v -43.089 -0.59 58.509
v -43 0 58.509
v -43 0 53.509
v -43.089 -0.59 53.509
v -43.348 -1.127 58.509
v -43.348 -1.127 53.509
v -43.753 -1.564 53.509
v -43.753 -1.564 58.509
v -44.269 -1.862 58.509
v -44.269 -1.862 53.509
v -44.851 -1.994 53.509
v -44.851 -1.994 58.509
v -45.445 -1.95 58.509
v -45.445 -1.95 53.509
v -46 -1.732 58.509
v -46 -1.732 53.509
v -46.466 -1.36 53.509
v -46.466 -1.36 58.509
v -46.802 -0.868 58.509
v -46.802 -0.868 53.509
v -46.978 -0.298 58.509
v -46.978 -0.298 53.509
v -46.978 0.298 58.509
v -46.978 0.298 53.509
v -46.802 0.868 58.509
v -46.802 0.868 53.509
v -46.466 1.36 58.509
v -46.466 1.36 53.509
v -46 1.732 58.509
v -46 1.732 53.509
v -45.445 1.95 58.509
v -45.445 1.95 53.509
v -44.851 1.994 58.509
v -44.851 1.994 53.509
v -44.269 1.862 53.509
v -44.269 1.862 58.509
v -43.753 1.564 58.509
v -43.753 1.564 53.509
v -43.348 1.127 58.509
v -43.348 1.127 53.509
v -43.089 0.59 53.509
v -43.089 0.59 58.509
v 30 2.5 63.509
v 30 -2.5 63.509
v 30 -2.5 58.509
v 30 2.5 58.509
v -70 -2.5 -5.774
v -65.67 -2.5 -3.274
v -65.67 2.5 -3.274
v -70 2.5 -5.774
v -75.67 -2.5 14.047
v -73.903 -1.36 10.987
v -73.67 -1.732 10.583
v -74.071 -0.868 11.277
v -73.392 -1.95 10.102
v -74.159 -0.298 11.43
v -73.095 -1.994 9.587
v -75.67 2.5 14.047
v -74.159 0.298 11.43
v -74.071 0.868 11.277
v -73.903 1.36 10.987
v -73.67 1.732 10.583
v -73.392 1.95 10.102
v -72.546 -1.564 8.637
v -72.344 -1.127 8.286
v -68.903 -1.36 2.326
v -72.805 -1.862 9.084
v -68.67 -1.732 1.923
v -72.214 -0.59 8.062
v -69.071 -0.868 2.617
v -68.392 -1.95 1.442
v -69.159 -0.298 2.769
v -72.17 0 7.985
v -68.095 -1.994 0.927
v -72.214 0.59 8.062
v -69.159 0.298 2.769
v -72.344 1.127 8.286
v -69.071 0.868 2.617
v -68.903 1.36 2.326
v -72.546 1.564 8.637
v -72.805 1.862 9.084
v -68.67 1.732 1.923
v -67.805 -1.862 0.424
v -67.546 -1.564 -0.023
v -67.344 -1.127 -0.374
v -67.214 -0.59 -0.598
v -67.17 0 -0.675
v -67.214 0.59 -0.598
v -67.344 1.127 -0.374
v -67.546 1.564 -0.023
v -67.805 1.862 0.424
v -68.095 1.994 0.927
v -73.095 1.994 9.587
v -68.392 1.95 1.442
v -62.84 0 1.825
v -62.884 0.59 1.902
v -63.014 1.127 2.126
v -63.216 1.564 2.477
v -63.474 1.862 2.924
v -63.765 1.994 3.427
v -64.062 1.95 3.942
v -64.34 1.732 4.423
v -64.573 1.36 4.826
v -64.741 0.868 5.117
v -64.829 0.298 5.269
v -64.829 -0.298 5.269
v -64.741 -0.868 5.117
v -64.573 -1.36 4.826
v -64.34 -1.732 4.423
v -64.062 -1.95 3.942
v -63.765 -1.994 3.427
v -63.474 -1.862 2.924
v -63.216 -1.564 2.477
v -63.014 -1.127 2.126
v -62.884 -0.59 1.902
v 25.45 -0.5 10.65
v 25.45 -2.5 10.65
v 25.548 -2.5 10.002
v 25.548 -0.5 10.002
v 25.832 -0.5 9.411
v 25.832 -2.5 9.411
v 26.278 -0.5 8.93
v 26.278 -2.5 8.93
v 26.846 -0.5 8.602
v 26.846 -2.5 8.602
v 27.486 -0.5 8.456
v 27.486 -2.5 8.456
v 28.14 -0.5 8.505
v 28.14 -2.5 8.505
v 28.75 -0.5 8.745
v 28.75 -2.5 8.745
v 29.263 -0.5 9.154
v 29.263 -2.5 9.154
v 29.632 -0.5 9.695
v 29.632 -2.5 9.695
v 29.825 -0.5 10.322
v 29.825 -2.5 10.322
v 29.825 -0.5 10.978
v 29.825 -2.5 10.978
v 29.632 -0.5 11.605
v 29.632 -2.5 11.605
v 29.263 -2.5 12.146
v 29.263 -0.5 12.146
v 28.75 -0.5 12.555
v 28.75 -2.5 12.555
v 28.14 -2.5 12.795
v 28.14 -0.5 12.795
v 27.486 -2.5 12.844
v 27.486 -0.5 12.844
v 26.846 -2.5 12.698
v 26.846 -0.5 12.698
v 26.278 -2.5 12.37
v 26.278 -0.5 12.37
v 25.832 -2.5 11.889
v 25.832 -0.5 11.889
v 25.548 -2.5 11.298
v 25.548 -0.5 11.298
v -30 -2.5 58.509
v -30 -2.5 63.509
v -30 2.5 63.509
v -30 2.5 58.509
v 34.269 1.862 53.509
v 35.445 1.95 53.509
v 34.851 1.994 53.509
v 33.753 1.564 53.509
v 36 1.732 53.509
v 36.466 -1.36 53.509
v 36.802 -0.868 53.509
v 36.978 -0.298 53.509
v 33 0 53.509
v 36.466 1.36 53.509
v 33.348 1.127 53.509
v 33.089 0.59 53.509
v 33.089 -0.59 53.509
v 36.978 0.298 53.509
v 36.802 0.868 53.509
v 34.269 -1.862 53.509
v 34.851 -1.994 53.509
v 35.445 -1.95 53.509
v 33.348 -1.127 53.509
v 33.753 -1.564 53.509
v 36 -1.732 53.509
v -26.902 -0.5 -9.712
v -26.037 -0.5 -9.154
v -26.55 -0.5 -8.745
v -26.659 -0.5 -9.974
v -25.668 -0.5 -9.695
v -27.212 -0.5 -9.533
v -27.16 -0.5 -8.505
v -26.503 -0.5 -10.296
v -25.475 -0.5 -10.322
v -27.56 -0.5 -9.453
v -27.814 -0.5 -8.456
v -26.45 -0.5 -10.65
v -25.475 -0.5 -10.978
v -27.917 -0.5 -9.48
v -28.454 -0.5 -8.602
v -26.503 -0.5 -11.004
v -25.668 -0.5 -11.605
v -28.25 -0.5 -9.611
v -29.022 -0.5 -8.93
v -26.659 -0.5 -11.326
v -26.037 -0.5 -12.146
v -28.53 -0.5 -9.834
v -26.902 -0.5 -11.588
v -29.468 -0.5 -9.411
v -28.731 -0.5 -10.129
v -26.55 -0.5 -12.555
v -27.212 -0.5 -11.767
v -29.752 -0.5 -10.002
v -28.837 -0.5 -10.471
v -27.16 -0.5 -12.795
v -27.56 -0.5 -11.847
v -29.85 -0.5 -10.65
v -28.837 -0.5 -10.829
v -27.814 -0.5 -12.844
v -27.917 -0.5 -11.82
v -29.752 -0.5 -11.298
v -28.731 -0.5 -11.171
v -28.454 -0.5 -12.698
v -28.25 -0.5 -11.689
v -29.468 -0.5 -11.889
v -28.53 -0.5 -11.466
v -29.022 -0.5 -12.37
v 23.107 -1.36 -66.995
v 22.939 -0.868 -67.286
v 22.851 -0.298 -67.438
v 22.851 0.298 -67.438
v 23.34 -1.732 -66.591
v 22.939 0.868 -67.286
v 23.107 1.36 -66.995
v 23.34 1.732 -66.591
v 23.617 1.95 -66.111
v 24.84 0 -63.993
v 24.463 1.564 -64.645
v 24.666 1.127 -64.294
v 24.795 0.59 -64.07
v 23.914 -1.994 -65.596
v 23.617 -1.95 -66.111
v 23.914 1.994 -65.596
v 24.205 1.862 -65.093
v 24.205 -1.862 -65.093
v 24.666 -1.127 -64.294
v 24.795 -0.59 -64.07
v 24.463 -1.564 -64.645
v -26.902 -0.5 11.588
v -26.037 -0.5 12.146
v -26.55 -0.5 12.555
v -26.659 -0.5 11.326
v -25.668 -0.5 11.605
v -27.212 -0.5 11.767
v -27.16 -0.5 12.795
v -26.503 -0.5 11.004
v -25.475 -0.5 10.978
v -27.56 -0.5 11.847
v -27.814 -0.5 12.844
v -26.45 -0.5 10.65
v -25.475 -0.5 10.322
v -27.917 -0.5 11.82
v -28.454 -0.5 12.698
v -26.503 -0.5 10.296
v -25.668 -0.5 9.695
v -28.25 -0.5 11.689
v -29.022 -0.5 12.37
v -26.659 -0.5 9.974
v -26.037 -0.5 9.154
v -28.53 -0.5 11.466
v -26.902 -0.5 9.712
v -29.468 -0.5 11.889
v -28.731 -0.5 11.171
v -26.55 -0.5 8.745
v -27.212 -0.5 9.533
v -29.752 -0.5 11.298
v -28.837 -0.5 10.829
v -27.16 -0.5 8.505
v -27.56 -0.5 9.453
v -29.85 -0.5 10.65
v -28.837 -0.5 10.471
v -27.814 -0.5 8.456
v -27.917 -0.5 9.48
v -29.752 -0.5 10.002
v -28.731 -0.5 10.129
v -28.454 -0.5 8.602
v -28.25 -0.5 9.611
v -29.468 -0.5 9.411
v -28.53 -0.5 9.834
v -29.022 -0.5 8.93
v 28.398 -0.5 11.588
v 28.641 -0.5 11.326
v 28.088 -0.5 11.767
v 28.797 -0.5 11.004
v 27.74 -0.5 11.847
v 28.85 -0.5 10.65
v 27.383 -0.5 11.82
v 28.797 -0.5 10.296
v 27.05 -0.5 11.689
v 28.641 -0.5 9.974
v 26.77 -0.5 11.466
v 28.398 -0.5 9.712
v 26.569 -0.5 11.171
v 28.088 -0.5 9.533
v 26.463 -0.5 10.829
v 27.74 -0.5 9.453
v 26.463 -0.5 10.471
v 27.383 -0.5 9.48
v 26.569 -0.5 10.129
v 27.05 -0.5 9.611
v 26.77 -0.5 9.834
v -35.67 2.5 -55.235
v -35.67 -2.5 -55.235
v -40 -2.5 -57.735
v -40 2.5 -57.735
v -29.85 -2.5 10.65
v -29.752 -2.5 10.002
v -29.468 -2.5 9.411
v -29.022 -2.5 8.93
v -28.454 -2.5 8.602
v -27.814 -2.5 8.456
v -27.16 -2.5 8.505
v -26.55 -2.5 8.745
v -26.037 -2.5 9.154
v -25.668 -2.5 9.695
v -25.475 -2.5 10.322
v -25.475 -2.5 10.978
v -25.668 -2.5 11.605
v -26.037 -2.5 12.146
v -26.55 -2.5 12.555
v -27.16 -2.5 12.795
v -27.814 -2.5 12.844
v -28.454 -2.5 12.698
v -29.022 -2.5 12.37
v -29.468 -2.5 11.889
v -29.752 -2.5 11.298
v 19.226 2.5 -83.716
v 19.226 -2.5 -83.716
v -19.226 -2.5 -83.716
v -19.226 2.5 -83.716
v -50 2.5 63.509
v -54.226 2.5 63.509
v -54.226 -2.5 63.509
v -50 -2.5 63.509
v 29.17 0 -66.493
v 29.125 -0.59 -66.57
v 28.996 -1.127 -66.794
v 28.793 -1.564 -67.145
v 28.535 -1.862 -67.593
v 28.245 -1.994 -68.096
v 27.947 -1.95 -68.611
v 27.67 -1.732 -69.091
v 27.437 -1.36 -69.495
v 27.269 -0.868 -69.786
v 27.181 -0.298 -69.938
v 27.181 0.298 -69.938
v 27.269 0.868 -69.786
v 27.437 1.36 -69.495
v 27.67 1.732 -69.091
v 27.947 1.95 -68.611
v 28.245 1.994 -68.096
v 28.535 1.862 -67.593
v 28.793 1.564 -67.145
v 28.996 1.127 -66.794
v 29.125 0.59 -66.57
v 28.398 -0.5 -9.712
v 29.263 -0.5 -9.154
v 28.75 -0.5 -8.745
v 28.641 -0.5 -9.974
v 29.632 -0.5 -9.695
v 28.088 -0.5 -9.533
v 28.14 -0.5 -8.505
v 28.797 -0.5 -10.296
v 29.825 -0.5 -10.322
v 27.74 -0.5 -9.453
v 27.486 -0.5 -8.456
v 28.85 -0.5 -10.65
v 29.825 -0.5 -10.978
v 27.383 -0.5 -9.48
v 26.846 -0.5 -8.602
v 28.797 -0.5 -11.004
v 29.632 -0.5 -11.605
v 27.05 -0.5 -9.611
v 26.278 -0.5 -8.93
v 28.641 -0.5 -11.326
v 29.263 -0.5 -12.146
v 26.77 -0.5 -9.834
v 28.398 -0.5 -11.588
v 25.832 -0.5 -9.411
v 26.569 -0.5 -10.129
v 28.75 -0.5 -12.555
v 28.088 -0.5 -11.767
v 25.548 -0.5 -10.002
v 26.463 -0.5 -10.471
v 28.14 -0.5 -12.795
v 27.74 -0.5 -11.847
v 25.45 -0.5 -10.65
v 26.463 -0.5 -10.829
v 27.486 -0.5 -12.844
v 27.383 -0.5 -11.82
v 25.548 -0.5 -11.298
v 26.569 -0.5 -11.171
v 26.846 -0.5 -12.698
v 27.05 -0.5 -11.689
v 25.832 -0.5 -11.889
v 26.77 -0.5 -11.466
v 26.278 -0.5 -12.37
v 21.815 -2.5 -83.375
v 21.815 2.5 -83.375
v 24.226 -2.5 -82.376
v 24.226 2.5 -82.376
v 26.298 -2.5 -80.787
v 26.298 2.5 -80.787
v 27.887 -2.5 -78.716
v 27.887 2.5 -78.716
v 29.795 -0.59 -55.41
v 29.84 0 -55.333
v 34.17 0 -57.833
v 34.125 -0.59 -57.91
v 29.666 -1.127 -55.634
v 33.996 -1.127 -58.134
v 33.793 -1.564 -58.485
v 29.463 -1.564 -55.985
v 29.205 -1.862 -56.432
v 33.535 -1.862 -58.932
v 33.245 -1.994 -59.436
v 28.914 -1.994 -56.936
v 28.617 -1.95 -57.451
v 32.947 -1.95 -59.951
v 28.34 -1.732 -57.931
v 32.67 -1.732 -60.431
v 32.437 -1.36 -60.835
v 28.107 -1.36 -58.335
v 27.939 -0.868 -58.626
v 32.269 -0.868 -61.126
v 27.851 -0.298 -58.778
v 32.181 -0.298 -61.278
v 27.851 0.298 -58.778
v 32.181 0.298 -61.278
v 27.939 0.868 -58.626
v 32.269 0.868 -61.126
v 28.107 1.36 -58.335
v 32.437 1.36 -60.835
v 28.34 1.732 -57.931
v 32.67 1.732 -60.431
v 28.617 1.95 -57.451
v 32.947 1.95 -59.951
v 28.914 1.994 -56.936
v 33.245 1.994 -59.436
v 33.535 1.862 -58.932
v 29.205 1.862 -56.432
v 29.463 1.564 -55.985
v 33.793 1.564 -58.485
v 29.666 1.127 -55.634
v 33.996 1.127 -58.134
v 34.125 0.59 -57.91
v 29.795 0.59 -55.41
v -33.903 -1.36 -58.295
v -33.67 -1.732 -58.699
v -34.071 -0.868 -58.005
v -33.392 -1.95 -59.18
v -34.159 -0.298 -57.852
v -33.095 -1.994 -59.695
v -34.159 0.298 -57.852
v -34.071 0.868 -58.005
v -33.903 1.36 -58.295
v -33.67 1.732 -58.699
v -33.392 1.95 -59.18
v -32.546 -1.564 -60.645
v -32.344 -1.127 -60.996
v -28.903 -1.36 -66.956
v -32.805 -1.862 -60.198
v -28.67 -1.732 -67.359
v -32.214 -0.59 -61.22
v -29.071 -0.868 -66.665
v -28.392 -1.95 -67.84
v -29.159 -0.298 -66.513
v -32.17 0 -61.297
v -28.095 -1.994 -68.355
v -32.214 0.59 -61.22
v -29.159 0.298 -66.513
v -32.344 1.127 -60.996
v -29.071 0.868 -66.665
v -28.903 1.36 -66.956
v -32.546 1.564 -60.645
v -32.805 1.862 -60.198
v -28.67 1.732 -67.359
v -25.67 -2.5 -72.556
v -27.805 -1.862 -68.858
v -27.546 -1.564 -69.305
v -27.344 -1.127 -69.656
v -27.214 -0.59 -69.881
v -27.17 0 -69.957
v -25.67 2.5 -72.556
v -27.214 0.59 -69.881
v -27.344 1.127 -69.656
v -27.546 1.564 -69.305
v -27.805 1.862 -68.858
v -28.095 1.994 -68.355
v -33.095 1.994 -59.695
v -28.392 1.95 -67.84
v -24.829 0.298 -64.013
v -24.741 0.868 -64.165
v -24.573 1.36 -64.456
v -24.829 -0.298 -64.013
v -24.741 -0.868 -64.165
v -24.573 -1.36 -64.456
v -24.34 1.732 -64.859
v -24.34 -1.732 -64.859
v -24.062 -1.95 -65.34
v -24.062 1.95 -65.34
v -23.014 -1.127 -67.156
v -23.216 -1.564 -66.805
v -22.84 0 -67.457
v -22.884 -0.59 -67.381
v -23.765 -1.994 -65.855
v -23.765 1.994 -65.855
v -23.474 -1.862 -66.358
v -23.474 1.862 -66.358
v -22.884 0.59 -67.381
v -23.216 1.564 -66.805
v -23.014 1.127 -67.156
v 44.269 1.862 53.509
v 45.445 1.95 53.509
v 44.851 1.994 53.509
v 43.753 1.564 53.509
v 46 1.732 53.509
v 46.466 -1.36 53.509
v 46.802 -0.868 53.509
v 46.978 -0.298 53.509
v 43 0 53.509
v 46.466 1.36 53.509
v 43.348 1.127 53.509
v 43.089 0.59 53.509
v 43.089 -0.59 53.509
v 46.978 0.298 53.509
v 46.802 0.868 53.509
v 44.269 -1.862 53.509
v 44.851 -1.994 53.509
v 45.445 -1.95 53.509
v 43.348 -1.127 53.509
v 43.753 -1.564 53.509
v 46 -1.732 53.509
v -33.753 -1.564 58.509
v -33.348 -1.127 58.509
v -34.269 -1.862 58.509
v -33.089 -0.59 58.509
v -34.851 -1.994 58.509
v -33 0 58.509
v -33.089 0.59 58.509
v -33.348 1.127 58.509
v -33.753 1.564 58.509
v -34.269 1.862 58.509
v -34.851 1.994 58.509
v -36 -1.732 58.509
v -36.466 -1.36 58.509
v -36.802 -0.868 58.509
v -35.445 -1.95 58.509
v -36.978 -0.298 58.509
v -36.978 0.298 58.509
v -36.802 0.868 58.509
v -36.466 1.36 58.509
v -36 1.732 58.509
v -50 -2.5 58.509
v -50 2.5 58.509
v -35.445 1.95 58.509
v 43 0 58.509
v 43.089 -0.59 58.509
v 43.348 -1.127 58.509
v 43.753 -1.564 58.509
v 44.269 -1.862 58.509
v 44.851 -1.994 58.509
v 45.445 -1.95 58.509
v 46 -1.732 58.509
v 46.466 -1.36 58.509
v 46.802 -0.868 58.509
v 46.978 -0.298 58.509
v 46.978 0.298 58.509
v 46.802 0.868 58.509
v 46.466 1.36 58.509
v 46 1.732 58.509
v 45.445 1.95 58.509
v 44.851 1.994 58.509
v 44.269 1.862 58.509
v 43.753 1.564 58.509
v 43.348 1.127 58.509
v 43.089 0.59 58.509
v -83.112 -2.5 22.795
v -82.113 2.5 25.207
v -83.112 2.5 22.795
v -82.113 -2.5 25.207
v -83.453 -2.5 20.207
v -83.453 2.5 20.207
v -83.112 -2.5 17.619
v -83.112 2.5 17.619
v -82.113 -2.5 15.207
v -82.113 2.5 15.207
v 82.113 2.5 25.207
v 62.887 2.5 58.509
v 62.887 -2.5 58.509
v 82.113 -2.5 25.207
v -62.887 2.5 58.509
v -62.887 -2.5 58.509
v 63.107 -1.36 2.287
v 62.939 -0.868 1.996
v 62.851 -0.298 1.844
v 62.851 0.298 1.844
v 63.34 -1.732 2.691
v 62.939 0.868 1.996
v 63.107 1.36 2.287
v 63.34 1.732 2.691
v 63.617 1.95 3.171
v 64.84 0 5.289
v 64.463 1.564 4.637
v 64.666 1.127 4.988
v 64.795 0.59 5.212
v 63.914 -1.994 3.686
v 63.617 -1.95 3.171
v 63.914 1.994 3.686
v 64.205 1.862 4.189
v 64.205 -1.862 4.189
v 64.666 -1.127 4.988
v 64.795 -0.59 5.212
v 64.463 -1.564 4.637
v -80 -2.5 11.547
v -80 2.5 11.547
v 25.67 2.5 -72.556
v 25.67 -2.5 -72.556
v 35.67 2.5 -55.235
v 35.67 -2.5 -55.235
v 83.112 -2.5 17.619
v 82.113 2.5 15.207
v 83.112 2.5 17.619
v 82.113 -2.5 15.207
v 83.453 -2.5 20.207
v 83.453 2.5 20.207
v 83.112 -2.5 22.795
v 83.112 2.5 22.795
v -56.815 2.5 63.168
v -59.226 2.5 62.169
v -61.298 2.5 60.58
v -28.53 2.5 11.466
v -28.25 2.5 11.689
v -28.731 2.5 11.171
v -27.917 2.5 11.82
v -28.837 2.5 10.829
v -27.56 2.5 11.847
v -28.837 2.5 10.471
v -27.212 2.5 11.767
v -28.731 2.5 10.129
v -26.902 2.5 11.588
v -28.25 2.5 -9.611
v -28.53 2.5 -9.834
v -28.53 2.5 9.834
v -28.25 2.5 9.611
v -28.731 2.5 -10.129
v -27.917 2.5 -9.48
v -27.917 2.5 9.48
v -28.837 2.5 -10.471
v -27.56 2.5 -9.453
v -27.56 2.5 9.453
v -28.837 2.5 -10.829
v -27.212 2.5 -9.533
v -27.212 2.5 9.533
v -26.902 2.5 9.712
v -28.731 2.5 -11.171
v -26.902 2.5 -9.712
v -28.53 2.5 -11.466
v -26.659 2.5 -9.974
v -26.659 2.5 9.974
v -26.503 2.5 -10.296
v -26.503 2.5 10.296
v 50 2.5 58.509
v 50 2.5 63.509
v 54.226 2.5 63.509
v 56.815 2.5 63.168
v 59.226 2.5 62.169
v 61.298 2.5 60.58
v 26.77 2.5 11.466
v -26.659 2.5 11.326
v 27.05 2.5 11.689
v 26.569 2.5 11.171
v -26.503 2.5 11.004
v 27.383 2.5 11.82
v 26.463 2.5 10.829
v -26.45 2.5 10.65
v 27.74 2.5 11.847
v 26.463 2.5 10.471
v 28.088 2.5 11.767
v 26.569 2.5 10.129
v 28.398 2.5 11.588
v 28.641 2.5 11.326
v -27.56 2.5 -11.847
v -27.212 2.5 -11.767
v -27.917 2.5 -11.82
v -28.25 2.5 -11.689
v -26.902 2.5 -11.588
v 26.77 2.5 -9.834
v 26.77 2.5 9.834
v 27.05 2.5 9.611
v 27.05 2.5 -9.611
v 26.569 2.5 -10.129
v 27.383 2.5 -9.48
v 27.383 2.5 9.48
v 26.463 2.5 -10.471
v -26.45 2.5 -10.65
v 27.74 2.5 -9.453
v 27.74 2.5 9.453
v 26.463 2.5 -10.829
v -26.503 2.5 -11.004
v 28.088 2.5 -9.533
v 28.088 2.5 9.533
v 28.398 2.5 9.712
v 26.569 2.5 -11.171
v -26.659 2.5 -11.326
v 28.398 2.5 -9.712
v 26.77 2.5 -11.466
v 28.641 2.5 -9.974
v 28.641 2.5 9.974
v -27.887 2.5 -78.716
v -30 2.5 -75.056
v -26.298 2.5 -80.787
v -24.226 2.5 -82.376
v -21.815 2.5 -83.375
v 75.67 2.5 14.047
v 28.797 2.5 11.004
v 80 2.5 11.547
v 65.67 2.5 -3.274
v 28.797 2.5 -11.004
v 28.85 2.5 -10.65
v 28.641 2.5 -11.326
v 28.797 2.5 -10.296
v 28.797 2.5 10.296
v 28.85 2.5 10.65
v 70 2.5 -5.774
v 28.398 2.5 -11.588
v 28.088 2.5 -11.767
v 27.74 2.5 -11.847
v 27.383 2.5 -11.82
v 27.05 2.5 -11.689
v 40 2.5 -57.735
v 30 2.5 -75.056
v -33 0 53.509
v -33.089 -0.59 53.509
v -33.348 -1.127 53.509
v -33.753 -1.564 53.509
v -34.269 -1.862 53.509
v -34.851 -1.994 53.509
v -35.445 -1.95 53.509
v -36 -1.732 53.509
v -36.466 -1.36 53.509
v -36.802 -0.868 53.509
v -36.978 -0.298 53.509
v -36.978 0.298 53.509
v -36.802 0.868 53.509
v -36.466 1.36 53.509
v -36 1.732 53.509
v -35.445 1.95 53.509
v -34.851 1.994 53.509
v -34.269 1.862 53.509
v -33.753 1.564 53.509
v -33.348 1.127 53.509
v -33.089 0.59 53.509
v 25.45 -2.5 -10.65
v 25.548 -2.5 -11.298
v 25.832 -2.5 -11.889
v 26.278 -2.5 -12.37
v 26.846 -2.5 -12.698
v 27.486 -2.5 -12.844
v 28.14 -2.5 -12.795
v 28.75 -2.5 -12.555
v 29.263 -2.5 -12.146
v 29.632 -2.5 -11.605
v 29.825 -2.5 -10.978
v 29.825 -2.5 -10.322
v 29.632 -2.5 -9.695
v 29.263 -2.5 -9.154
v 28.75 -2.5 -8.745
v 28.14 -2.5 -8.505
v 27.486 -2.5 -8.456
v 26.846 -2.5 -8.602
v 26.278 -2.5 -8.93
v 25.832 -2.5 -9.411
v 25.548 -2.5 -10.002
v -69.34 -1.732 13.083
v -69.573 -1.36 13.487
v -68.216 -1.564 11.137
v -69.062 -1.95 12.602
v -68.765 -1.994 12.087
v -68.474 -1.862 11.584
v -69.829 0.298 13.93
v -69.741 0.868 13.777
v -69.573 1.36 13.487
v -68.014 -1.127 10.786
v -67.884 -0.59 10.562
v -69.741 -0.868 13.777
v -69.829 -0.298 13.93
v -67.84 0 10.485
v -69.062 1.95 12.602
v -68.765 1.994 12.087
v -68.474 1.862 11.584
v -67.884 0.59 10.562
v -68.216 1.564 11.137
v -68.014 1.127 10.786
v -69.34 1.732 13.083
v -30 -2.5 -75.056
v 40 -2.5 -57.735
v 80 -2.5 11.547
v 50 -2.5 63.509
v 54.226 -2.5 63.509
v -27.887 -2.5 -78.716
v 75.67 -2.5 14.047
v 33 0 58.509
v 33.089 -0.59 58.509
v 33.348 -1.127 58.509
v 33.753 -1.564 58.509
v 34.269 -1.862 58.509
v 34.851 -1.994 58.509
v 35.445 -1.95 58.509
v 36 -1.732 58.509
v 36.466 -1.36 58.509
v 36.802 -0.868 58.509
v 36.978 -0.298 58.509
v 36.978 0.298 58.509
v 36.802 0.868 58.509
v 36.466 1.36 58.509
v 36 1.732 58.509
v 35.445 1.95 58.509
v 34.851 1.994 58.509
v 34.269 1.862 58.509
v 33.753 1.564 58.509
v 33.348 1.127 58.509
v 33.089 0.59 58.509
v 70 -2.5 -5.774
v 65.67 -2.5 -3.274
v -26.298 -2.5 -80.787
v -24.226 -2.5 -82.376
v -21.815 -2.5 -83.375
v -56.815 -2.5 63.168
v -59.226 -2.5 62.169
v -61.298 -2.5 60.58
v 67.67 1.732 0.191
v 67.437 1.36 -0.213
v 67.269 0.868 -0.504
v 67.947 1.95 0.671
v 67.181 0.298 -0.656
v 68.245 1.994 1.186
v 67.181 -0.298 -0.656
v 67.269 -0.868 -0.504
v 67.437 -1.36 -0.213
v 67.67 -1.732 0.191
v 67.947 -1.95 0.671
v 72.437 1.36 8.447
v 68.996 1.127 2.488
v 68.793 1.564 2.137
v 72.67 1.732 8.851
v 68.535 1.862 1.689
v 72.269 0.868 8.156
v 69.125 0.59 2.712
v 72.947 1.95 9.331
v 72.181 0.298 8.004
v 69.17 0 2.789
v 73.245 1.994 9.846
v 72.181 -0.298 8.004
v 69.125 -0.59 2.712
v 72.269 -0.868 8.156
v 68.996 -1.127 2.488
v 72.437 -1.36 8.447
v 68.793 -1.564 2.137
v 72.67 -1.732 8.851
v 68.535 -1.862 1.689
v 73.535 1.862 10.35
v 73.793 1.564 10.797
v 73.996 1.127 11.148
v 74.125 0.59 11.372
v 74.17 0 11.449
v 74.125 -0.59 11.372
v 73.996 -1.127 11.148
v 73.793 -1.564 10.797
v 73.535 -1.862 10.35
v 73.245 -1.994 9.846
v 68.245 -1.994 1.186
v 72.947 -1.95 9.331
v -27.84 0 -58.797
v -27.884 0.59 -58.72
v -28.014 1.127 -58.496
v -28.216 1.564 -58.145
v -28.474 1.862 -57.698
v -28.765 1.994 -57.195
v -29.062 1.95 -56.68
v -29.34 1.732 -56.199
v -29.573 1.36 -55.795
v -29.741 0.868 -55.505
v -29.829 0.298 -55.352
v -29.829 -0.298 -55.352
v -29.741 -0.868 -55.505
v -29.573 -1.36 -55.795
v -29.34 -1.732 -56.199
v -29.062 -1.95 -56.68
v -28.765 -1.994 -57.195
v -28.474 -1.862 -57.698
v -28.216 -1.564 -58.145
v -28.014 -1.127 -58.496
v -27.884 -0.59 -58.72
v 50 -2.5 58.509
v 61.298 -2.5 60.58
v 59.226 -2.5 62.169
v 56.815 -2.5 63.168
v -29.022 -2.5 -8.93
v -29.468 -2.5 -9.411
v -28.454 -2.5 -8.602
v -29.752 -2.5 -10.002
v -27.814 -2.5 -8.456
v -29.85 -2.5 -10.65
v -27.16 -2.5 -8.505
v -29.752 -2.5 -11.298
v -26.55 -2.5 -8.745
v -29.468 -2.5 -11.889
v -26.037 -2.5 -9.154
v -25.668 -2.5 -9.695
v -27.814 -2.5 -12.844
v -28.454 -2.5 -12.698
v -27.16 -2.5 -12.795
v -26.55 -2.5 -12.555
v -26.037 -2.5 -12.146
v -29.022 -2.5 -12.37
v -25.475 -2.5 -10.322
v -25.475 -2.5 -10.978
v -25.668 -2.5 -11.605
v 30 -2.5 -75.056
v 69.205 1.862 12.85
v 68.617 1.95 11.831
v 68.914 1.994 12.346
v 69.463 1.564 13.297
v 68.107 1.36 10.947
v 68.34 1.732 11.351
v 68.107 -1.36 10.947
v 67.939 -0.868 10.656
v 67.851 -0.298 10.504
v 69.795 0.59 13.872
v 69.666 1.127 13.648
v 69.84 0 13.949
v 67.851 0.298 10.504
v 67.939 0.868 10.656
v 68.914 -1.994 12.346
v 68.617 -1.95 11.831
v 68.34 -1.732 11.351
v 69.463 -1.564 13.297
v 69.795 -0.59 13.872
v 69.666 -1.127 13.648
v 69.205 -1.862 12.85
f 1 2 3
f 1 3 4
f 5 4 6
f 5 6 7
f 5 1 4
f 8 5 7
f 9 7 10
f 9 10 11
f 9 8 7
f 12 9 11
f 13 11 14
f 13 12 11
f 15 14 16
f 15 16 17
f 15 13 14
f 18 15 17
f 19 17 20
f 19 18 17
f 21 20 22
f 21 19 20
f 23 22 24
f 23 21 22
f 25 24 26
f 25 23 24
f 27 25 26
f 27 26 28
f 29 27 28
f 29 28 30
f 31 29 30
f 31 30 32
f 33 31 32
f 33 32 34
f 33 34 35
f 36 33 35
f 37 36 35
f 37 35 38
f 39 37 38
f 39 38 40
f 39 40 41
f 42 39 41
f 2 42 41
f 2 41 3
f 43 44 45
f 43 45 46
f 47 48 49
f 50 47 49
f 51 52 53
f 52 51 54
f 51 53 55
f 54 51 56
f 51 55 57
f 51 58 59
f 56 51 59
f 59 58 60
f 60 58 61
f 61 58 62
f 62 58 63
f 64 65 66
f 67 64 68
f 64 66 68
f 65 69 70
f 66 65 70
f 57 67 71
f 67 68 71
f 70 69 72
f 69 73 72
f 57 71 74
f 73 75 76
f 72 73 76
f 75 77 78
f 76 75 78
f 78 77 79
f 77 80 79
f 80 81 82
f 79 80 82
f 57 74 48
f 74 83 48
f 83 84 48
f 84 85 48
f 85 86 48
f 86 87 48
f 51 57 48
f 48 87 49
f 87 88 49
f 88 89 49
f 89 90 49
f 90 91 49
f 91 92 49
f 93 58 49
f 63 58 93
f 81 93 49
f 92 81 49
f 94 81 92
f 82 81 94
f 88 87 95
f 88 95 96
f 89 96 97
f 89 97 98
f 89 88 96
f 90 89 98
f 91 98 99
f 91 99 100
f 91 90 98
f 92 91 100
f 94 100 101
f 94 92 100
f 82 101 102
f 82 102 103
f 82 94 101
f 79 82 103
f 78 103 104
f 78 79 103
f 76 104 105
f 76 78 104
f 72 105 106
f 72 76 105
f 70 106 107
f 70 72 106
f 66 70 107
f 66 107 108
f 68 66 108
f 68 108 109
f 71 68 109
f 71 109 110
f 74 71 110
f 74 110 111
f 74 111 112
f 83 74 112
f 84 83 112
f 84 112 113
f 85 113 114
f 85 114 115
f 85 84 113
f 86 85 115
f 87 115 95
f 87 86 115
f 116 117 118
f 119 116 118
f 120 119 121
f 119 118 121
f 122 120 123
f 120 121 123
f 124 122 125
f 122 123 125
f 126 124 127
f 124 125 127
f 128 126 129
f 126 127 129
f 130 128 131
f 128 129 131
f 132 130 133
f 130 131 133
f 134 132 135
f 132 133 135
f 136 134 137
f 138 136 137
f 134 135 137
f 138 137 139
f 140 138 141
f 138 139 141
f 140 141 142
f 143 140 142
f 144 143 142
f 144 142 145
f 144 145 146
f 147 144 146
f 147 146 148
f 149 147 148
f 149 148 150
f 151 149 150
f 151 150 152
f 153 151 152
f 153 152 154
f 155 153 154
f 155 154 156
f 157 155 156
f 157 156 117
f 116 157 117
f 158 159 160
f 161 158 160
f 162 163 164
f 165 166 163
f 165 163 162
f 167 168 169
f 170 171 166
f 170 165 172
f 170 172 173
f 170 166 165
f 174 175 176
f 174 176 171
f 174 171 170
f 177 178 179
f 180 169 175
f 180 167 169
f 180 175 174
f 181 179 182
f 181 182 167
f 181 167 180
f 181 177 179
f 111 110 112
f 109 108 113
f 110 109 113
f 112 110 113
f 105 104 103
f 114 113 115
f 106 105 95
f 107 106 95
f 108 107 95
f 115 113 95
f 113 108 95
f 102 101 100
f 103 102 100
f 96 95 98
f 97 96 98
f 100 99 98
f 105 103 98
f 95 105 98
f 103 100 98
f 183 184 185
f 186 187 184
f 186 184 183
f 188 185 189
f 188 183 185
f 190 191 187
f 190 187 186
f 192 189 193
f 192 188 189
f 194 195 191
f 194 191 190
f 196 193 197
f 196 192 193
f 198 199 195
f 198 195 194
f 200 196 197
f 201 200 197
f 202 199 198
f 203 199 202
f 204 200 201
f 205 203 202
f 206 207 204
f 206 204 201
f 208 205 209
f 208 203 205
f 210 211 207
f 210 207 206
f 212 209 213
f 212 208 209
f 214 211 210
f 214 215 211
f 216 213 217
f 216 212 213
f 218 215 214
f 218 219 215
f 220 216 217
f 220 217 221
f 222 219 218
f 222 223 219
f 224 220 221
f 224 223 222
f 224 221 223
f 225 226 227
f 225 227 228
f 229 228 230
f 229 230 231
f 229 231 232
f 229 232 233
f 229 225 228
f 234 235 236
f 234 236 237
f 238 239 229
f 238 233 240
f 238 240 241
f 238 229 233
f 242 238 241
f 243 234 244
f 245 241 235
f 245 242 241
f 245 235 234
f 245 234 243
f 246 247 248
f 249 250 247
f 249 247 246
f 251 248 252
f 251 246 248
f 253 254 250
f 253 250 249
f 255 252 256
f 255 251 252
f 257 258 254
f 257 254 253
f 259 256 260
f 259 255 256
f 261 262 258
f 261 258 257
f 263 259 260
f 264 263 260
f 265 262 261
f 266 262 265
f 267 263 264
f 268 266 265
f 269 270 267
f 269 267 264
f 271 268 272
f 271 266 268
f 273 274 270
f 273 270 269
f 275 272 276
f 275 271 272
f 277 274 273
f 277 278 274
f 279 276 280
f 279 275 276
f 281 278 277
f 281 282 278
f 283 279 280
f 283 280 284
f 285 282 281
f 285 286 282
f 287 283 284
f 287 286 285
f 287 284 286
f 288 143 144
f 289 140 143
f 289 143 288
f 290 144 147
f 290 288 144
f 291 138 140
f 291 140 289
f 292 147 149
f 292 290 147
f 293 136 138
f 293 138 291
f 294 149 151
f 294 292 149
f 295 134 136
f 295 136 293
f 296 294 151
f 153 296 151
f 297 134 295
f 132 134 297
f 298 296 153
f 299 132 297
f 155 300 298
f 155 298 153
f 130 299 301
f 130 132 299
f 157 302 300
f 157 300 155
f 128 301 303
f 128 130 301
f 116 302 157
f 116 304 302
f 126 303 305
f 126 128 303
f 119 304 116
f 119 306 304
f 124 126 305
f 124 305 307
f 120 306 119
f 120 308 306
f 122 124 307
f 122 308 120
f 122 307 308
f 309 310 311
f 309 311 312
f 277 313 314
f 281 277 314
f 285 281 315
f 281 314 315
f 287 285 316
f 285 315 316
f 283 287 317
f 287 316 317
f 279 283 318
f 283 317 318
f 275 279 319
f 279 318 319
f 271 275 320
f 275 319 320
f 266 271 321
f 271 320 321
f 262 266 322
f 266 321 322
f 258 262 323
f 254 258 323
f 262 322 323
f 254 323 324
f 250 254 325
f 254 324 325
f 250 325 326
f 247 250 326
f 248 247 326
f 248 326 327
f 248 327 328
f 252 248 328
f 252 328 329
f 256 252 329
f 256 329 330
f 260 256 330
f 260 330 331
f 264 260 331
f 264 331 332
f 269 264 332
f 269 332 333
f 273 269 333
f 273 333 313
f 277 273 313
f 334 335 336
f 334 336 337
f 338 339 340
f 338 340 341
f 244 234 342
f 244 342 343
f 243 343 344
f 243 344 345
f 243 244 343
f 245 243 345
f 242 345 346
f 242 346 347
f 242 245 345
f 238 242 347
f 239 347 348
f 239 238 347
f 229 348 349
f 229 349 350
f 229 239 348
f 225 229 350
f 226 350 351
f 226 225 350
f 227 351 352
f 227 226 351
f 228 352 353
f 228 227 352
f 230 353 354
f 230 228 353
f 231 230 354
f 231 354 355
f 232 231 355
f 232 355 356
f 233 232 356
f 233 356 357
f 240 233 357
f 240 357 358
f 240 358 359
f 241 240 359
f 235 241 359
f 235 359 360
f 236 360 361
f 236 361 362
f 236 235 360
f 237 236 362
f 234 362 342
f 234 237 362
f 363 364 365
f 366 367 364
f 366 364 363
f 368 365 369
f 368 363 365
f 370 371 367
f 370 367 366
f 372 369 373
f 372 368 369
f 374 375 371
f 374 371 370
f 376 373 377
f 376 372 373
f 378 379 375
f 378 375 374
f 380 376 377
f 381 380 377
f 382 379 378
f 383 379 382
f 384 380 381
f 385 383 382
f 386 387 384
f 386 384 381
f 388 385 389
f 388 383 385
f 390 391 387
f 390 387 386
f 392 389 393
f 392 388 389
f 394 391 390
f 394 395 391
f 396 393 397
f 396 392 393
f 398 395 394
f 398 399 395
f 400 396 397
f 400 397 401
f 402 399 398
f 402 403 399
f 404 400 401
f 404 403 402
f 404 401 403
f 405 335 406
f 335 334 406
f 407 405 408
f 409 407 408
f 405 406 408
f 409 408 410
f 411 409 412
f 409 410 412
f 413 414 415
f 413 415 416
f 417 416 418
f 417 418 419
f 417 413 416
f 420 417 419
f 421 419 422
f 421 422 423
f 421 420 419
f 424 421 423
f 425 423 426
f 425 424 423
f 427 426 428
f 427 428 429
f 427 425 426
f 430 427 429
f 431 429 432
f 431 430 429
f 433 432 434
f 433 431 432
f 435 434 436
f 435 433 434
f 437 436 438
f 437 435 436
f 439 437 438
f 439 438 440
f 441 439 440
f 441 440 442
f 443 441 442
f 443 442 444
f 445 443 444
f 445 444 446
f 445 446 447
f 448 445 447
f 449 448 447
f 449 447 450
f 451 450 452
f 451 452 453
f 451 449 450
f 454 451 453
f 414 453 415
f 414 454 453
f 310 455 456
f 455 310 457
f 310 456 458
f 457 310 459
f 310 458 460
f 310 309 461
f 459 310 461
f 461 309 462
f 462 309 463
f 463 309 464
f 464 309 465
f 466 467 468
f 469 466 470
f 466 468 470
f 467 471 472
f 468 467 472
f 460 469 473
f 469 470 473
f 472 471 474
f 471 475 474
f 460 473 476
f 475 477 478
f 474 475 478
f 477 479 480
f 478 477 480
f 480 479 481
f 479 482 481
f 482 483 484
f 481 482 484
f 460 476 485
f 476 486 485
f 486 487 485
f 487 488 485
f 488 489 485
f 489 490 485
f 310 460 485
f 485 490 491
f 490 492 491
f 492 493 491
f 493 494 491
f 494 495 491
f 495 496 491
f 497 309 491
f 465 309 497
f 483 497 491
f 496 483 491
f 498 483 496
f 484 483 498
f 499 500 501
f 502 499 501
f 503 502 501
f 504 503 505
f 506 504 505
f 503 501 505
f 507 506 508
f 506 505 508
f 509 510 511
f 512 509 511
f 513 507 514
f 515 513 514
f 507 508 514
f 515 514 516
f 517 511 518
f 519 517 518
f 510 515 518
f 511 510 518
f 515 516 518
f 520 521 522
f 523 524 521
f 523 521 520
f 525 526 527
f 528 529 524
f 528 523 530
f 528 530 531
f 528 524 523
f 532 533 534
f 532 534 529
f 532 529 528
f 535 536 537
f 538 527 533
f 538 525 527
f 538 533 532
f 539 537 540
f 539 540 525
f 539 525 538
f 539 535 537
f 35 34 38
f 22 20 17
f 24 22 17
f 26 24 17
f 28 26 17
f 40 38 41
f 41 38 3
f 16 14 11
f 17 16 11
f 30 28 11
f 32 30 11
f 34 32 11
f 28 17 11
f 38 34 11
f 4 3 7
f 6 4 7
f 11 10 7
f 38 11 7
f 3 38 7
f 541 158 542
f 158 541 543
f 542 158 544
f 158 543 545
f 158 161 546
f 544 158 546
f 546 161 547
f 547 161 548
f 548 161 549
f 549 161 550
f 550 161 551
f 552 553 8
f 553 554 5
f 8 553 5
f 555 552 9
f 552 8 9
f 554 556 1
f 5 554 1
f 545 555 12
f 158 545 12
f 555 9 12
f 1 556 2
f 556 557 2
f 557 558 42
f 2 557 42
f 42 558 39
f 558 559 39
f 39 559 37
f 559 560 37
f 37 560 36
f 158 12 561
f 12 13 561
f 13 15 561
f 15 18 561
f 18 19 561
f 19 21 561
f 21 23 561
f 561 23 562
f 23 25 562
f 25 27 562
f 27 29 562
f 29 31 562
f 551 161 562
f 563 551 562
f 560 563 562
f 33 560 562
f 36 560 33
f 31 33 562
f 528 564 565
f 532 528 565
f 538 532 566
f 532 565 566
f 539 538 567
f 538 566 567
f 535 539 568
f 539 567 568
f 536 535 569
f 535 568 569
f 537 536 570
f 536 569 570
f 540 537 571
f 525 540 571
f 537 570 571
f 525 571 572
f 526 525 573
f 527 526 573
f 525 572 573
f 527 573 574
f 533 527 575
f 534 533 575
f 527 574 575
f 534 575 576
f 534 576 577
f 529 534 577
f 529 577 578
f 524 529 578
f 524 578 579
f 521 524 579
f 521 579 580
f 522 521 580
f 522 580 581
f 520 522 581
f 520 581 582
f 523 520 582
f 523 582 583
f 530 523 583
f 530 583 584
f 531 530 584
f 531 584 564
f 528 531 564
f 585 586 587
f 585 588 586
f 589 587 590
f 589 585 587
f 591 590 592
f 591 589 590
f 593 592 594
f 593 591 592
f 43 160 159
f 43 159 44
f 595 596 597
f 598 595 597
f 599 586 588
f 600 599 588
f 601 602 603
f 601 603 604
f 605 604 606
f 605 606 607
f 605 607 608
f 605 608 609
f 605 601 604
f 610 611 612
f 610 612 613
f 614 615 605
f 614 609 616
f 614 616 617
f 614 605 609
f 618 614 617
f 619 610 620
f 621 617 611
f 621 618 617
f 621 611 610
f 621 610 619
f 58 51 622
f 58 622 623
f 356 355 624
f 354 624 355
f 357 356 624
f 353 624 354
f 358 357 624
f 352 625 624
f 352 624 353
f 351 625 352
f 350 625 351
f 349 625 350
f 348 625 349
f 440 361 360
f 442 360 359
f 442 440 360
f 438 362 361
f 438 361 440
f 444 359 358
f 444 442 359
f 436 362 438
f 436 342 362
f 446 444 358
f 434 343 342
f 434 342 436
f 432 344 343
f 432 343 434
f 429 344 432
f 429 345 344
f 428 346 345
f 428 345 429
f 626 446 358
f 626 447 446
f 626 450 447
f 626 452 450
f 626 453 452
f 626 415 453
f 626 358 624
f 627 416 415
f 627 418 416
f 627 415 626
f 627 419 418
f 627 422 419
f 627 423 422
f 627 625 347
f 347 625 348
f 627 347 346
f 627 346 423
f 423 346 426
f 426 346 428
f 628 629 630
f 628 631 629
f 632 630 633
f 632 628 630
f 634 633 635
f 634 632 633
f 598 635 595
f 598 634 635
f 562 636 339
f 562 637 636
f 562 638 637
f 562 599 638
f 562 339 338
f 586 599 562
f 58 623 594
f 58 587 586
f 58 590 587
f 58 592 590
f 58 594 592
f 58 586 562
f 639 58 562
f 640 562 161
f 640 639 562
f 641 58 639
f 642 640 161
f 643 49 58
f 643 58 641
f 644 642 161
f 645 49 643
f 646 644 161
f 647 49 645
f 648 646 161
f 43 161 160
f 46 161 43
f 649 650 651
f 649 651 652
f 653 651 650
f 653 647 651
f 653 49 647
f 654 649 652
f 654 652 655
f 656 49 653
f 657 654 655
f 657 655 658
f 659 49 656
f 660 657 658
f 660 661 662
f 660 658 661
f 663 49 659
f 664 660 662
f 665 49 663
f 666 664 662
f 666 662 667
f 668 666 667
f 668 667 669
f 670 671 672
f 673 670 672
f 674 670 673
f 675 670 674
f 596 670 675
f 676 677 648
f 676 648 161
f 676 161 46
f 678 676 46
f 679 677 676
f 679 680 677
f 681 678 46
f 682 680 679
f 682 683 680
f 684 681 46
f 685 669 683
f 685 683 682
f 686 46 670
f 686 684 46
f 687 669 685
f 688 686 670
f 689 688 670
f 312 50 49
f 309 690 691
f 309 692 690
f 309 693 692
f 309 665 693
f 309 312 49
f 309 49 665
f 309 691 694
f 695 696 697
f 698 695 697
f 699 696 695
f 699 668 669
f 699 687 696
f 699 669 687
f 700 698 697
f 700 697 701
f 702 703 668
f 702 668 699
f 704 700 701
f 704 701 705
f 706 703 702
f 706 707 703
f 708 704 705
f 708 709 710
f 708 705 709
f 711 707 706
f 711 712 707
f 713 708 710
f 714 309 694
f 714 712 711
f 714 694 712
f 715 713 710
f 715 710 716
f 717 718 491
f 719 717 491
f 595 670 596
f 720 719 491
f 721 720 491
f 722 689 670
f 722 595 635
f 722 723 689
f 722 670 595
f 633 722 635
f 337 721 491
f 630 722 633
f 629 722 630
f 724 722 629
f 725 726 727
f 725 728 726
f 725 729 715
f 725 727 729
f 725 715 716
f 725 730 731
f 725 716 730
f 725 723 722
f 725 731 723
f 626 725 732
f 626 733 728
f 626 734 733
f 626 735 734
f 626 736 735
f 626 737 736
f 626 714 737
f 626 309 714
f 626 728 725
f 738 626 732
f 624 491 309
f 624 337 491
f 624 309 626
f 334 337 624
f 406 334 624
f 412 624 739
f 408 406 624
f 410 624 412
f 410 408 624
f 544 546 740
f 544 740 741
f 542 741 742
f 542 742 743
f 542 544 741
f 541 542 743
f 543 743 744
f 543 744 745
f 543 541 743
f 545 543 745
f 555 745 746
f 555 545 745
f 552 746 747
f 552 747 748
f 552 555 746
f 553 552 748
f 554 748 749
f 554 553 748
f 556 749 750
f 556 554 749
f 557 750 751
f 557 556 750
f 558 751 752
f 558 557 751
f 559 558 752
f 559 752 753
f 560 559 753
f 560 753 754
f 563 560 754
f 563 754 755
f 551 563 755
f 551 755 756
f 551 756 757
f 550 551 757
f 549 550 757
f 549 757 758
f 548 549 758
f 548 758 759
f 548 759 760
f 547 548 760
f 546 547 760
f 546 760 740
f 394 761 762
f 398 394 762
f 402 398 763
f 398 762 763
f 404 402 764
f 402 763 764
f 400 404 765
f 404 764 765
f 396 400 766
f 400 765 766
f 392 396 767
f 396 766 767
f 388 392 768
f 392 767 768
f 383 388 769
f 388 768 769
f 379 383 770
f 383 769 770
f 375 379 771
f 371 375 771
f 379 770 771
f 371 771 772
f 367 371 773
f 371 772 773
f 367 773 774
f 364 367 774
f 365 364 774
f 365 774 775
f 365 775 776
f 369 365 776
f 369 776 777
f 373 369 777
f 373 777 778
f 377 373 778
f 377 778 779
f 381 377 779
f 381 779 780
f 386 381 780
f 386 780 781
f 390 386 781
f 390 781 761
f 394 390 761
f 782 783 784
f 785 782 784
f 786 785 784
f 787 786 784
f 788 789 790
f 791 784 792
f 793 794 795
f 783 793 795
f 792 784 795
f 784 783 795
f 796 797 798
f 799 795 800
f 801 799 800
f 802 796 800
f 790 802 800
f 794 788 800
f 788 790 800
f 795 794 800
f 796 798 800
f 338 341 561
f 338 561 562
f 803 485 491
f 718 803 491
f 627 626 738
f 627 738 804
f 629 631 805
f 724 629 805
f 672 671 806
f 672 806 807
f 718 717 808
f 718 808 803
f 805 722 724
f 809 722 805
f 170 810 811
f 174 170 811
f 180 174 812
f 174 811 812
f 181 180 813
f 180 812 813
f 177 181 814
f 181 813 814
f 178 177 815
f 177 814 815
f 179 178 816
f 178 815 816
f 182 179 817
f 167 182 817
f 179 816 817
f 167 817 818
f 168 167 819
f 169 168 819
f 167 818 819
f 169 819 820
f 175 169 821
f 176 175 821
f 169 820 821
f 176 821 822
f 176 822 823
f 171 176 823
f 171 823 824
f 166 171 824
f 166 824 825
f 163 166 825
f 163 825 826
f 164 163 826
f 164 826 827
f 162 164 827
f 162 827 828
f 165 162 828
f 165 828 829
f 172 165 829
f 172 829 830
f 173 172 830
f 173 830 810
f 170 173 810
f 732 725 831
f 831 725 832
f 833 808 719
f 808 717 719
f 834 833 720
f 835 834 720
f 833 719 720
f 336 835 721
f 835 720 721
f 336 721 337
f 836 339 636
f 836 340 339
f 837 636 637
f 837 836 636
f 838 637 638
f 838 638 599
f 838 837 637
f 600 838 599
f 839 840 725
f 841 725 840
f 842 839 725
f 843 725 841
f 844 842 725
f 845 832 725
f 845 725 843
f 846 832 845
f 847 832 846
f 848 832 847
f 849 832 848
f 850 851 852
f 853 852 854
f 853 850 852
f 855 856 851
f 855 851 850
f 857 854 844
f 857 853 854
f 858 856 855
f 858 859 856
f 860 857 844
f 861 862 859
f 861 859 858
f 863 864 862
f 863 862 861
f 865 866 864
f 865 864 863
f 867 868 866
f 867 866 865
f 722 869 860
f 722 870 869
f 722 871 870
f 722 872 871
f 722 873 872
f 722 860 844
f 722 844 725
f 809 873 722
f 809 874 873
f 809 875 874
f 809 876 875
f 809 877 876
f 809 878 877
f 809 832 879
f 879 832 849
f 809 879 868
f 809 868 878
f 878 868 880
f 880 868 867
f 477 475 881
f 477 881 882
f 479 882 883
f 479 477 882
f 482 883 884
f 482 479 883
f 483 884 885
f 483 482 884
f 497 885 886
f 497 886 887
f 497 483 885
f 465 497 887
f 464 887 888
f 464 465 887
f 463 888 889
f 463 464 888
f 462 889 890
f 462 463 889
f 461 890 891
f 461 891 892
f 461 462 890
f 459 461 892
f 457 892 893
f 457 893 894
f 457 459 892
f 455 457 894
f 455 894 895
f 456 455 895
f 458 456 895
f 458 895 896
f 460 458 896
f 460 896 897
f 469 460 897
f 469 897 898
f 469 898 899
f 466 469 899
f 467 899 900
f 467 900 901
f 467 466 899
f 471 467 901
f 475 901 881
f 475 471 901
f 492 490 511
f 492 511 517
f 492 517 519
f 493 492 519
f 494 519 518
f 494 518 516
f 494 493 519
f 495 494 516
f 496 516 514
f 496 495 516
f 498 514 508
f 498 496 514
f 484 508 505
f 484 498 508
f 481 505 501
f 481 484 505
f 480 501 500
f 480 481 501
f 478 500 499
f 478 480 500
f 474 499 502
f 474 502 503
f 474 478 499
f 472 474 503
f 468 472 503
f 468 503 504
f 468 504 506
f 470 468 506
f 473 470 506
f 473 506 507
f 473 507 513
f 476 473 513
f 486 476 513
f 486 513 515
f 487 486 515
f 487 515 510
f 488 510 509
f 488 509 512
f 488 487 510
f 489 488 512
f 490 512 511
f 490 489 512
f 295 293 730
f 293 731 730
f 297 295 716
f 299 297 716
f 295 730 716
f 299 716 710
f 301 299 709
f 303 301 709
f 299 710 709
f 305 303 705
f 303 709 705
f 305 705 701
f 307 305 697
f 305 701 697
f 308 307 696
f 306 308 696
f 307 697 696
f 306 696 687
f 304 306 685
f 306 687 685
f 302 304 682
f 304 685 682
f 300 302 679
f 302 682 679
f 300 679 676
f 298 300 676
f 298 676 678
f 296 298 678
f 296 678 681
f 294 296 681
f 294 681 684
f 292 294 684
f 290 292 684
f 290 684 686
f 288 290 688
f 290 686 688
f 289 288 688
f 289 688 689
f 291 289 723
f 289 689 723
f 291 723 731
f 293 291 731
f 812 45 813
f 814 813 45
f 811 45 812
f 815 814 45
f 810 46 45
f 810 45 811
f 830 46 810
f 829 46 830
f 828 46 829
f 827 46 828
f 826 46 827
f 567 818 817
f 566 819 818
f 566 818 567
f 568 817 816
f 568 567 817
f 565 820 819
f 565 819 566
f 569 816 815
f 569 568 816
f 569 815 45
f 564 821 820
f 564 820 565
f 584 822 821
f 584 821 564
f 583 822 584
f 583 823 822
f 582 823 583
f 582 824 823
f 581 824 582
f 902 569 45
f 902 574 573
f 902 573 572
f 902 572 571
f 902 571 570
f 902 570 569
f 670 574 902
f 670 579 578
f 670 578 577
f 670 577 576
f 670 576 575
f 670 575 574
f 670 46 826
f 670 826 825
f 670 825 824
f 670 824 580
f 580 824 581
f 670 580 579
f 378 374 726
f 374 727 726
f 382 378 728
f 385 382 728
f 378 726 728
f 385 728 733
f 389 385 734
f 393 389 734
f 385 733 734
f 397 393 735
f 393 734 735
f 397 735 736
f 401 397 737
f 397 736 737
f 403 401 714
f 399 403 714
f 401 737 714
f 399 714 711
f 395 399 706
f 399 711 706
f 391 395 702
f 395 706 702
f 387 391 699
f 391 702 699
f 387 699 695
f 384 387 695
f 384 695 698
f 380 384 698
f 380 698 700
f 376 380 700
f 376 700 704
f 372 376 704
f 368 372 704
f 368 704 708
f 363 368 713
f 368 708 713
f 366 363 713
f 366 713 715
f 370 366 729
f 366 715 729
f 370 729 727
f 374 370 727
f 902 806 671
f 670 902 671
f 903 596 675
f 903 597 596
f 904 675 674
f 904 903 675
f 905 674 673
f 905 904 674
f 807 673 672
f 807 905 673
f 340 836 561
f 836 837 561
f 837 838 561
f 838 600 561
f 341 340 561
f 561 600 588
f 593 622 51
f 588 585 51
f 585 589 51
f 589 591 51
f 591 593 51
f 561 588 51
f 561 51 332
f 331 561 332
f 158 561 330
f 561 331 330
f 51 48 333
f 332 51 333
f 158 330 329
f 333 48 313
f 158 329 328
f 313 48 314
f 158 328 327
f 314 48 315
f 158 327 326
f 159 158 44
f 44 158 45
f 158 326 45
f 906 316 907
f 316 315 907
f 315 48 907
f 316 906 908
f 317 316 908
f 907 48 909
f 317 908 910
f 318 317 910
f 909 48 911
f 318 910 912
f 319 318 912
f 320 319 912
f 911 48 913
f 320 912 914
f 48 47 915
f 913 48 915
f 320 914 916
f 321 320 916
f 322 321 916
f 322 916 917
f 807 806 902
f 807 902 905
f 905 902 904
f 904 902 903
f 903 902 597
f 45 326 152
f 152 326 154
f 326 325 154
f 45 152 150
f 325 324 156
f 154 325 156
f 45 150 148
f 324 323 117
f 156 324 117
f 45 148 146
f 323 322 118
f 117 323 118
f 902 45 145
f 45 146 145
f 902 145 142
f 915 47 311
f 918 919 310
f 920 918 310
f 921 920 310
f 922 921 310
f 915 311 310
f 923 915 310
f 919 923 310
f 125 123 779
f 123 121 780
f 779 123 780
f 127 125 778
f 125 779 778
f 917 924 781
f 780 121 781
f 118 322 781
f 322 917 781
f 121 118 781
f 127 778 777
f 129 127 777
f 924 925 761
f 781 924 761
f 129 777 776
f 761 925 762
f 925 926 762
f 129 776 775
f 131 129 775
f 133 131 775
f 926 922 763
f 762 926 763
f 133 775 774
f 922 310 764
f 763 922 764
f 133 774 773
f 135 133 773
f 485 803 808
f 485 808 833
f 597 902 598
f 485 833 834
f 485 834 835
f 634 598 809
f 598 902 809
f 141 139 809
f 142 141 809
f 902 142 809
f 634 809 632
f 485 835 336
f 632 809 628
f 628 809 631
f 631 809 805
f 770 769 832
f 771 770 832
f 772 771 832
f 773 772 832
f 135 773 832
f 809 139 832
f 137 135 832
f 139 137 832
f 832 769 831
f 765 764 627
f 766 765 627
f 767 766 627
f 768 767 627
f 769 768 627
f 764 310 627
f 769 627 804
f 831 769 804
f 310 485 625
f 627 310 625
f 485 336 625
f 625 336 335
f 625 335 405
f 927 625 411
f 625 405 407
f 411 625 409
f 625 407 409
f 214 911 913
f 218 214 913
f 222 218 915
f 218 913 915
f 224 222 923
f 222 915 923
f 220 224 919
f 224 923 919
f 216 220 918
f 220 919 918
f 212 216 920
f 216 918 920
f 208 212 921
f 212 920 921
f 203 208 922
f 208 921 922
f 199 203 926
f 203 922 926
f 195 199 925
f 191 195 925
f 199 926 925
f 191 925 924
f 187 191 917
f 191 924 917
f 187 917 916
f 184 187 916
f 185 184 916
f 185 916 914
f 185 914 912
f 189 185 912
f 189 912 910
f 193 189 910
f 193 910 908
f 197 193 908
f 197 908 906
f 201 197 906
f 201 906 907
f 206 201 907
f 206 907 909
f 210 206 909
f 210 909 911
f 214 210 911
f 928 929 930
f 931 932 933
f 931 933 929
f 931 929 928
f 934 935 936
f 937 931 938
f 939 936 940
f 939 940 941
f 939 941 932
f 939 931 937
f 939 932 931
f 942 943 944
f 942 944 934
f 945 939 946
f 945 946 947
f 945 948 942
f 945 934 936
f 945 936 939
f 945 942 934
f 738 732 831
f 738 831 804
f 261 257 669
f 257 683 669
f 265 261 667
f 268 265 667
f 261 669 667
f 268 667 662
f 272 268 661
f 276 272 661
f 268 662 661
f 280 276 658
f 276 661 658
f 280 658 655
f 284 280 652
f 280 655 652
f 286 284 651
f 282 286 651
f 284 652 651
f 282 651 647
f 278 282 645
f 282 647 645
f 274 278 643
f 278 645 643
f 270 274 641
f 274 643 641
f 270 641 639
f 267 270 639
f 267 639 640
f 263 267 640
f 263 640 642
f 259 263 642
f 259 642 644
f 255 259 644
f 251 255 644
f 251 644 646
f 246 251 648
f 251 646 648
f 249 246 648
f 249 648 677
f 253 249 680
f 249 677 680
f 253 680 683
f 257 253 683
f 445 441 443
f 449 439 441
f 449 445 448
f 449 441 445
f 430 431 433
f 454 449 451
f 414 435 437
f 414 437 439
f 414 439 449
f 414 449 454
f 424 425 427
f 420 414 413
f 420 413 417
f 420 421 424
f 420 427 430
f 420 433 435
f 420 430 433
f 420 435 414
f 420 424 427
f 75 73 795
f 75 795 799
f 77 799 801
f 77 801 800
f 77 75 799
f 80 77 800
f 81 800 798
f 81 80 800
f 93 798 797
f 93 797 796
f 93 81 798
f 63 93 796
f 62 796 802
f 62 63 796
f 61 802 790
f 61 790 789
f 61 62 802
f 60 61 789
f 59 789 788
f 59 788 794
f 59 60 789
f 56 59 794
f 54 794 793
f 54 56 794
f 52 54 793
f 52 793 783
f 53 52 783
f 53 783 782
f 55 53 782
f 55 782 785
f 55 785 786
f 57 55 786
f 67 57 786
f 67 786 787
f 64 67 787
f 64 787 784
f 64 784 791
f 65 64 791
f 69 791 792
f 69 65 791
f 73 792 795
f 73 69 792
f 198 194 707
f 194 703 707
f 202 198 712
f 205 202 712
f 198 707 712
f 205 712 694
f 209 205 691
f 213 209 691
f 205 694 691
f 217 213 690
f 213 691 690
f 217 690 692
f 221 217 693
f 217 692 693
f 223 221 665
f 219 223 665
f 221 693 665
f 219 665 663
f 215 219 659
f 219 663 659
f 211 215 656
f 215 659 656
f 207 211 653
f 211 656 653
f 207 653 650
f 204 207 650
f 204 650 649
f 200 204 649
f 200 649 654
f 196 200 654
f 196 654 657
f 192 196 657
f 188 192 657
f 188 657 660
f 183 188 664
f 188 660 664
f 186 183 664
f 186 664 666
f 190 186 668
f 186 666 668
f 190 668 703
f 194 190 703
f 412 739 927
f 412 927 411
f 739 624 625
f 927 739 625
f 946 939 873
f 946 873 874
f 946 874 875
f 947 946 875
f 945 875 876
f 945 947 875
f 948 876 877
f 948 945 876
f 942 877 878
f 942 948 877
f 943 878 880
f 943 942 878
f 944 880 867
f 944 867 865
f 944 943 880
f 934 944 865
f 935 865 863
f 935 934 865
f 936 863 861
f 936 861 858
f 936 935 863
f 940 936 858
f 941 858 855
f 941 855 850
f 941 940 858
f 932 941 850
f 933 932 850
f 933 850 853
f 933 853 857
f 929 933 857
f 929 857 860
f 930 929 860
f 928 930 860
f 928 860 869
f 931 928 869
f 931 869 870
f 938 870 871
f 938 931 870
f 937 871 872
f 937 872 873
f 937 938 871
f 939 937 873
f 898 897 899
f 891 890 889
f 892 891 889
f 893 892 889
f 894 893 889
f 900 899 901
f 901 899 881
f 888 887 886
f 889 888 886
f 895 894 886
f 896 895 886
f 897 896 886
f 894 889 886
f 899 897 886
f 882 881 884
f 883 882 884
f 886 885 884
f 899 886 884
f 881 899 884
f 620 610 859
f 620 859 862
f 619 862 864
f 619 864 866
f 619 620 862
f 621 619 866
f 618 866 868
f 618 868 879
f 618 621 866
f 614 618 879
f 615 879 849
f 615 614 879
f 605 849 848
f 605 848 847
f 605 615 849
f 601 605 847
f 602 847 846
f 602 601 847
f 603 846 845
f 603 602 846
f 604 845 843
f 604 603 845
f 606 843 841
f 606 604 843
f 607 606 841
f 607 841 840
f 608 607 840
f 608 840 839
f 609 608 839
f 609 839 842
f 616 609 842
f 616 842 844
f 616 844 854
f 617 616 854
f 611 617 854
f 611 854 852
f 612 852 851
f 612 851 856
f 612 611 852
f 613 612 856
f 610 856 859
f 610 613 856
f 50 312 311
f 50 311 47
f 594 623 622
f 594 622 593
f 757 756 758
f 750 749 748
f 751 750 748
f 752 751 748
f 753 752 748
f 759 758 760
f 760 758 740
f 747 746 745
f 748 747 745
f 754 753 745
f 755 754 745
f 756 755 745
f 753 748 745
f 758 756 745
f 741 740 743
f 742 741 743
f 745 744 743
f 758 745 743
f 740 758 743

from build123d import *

# Parameters (mm, degrees)
BOSS_EXTRUDE1_DEPTH            = 2.5
CHAMFER1_SIZE                  = 50
SKETCH4_W                      = 20
SKETCH4_H                      = 5
SKETCH4_R                      = 2
CUT_EXTRUDE1_DEPTH             = 5
SKETCH4_2_R                    = 2
CUT_EXTRUDE2_DEPTH             = 10
CRVPATTERN1_START              = -63.508529611
CRVPATTERN1_OUTLINE_W          = 20
CRVPATTERN1_OUTLINE_H          = 5
CRVPATTERN1_DEPTH              = 5
CRVPATTERN1_START_2            = -58.508529611
CRVPATTERN1_2_OUTLINE_R        = 2
CRVPATTERN1_2_DEPTH            = 5
CRVPATTERN1_START_3            = 58.508529611
CRVPATTERN1_3_OUTLINE_W        = 20
CRVPATTERN1_3_OUTLINE_H        = 5
CRVPATTERN1_3_DEPTH            = 5
CRVPATTERN1_START_4            = 53.508529611
CRVPATTERN1_4_OUTLINE_R        = 2
CRVPATTERN1_4_DEPTH            = 5
FILLET1_R                      = 10
CBORE_FOR_M2_SHCS1_D           = 2.4
CBORE_FOR_M2_SHCS1_CBORE_D     = 4.4
CBORE_FOR_M2_SHCS1_CBORE_DEPTH = 2


# Read off the part's stored shape, not the designer's step: CrvPattern1
with BuildPart() as part:
    # Sketch1 → Boss-Extrude1 (new, symmetric)
    with BuildSketch(Plane(origin=(0, 0, 0), x_dir=(1, 0, 0), z_dir=(0, 1, 0))):
        Polygon((110, -63.508529611), (0, 127.017059222), (-110, -63.508529611), align=None)
    extrude(amount=BOSS_EXTRUDE1_DEPTH, both=True)

    # Chamfer1
    chamfer1_edges = [part.edges().sort_by_distance(p)[0] for p in [
        (-110, 0, 63.508529611),
        (0, 0, -127.017059222),
        (110, 0, 63.508529611),
    ]]
    chamfer(chamfer1_edges, length=CHAMFER1_SIZE)

    # Sketch4 → Cut-Extrude1 (cut)
    with BuildSketch(Plane(origin=(4.375288244, 0, 63.508529611), x_dir=(-1, 0, 0), z_dir=(0, 0, -1))):
        with Locations((44.375288244, 0)):
            Rectangle(SKETCH4_W, SKETCH4_H)
        with Locations((39.375288244, 0)):
            Circle(SKETCH4_R, mode=Mode.SUBTRACT)
        with Locations((49.375288244, 0)):
            Circle(SKETCH4_R, mode=Mode.SUBTRACT)
    cut_extrude1 = extrude(amount=CUT_EXTRUDE1_DEPTH, mode=Mode.SUBTRACT)

    # Sketch4<2> → Cut-Extrude2 (cut)
    with BuildSketch(Plane(origin=(4.375288244, 0, 63.508529611), x_dir=(-1, 0, 0), z_dir=(0, 0, -1))):
        with Locations(Location((49.375288244, 0, 0), (0, 0, 180))):
            Circle(SKETCH4_2_R)
        with Locations(Location((39.375288244, 0, 0), (0, 0, 180))):
            Circle(SKETCH4_2_R)
    cut_extrude2 = extrude(amount=CUT_EXTRUDE2_DEPTH, mode=Mode.SUBTRACT)

    # Mirror1: Cut-Extrude1, Cut-Extrude2 across plane
    add(cut_extrude1.mirror(Plane(origin=(0, 0, 0), x_dir=(0, 0, 1), z_dir=(1, 0, 0))), mode=Mode.SUBTRACT)
    add(cut_extrude2.mirror(Plane(origin=(0, 0, 0), x_dir=(0, 0, 1), z_dir=(1, 0, 0))), mode=Mode.SUBTRACT)

    # CrvPattern1 outline → CrvPattern1 (cut)
    with BuildSketch(Plane(origin=(0, 0, 0), x_dir=(0.499999999999987, 0, -0.8660254037844463), z_dir=(0.8660254037844461, 0, 0.49999999999998707)).offset(CRVPATTERN1_START)):
        with Locations((-40, 0)):
            Rectangle(CRVPATTERN1_OUTLINE_W, CRVPATTERN1_OUTLINE_H)
        with Locations((40, 0)):
            Rectangle(CRVPATTERN1_OUTLINE_W, CRVPATTERN1_OUTLINE_H)
    extrude(amount=CRVPATTERN1_DEPTH, mode=Mode.SUBTRACT)

    # CrvPattern1 2 outline → CrvPattern1 2 (cut)
    with BuildSketch(Plane(origin=(0, 0, 0), x_dir=(0.499999999999987, 0, -0.8660254037844463), z_dir=(0.8660254037844461, 0, 0.49999999999998707)).offset(CRVPATTERN1_START_2)):
        with Locations((-35, 0)):
            Circle(CRVPATTERN1_2_OUTLINE_R)
        with Locations((-45, 0)):
            Circle(CRVPATTERN1_2_OUTLINE_R)
        with Locations((35, 0)):
            Circle(CRVPATTERN1_2_OUTLINE_R)
        with Locations((45, 0)):
            Circle(CRVPATTERN1_2_OUTLINE_R)
    extrude(amount=CRVPATTERN1_2_DEPTH, mode=Mode.SUBTRACT)

    # CrvPattern1 3 outline → CrvPattern1 3 (cut)
    with BuildSketch(Plane(origin=(0, 0, 0), x_dir=(0.500000000000001, 0, 0.866025403784438), z_dir=(0.866025403784438, 0, -0.500000000000001)).offset(CRVPATTERN1_START_3)):
        with Locations((-40, 0)):
            Rectangle(CRVPATTERN1_3_OUTLINE_W, CRVPATTERN1_3_OUTLINE_H)
        with Locations((40, 0)):
            Rectangle(CRVPATTERN1_3_OUTLINE_W, CRVPATTERN1_3_OUTLINE_H)
    extrude(amount=CRVPATTERN1_3_DEPTH, mode=Mode.SUBTRACT)

    # CrvPattern1 4 outline → CrvPattern1 4 (cut)
    with BuildSketch(Plane(origin=(0, 0, 0), x_dir=(0.500000000000001, 0, 0.866025403784438), z_dir=(0.866025403784438, 0, -0.500000000000001)).offset(CRVPATTERN1_START_4)):
        with Locations((-35, 0)):
            Circle(CRVPATTERN1_4_OUTLINE_R)
        with Locations((-45, 0)):
            Circle(CRVPATTERN1_4_OUTLINE_R)
        with Locations((35, 0)):
            Circle(CRVPATTERN1_4_OUTLINE_R)
        with Locations((45, 0)):
            Circle(CRVPATTERN1_4_OUTLINE_R)
    extrude(amount=CRVPATTERN1_4_DEPTH, mode=Mode.SUBTRACT)

    # Fillet1
    fillet1_edges = [part.edges().sort_by_distance(p)[0] for p in [
        (60, 0, 63.508529611),
        (-60, 0, 63.508529611),
        (-25, 0, -83.715789032),
        (-85, 0, 20.207259422),
        (25, 0, -83.715789032),
        (85, 0, 20.207259422),
    ]]
    fillet(fillet1_edges, radius=FILLET1_R)

    # CBORE for M2 SHCS1 (through all)
    with Locations(Plane(origin=(0, -2.5, 0), x_dir=(-1, 0, 0), z_dir=(0, -1, 0))):
        with Locations((-27.65, -10.65), (27.65, 10.65), (27.65, -10.65), (-27.65, 10.65)):
            CounterBoreHole(CBORE_FOR_M2_SHCS1_D / 2, CBORE_FOR_M2_SHCS1_CBORE_D / 2, CBORE_FOR_M2_SHCS1_CBORE_DEPTH)


solid = part.part
